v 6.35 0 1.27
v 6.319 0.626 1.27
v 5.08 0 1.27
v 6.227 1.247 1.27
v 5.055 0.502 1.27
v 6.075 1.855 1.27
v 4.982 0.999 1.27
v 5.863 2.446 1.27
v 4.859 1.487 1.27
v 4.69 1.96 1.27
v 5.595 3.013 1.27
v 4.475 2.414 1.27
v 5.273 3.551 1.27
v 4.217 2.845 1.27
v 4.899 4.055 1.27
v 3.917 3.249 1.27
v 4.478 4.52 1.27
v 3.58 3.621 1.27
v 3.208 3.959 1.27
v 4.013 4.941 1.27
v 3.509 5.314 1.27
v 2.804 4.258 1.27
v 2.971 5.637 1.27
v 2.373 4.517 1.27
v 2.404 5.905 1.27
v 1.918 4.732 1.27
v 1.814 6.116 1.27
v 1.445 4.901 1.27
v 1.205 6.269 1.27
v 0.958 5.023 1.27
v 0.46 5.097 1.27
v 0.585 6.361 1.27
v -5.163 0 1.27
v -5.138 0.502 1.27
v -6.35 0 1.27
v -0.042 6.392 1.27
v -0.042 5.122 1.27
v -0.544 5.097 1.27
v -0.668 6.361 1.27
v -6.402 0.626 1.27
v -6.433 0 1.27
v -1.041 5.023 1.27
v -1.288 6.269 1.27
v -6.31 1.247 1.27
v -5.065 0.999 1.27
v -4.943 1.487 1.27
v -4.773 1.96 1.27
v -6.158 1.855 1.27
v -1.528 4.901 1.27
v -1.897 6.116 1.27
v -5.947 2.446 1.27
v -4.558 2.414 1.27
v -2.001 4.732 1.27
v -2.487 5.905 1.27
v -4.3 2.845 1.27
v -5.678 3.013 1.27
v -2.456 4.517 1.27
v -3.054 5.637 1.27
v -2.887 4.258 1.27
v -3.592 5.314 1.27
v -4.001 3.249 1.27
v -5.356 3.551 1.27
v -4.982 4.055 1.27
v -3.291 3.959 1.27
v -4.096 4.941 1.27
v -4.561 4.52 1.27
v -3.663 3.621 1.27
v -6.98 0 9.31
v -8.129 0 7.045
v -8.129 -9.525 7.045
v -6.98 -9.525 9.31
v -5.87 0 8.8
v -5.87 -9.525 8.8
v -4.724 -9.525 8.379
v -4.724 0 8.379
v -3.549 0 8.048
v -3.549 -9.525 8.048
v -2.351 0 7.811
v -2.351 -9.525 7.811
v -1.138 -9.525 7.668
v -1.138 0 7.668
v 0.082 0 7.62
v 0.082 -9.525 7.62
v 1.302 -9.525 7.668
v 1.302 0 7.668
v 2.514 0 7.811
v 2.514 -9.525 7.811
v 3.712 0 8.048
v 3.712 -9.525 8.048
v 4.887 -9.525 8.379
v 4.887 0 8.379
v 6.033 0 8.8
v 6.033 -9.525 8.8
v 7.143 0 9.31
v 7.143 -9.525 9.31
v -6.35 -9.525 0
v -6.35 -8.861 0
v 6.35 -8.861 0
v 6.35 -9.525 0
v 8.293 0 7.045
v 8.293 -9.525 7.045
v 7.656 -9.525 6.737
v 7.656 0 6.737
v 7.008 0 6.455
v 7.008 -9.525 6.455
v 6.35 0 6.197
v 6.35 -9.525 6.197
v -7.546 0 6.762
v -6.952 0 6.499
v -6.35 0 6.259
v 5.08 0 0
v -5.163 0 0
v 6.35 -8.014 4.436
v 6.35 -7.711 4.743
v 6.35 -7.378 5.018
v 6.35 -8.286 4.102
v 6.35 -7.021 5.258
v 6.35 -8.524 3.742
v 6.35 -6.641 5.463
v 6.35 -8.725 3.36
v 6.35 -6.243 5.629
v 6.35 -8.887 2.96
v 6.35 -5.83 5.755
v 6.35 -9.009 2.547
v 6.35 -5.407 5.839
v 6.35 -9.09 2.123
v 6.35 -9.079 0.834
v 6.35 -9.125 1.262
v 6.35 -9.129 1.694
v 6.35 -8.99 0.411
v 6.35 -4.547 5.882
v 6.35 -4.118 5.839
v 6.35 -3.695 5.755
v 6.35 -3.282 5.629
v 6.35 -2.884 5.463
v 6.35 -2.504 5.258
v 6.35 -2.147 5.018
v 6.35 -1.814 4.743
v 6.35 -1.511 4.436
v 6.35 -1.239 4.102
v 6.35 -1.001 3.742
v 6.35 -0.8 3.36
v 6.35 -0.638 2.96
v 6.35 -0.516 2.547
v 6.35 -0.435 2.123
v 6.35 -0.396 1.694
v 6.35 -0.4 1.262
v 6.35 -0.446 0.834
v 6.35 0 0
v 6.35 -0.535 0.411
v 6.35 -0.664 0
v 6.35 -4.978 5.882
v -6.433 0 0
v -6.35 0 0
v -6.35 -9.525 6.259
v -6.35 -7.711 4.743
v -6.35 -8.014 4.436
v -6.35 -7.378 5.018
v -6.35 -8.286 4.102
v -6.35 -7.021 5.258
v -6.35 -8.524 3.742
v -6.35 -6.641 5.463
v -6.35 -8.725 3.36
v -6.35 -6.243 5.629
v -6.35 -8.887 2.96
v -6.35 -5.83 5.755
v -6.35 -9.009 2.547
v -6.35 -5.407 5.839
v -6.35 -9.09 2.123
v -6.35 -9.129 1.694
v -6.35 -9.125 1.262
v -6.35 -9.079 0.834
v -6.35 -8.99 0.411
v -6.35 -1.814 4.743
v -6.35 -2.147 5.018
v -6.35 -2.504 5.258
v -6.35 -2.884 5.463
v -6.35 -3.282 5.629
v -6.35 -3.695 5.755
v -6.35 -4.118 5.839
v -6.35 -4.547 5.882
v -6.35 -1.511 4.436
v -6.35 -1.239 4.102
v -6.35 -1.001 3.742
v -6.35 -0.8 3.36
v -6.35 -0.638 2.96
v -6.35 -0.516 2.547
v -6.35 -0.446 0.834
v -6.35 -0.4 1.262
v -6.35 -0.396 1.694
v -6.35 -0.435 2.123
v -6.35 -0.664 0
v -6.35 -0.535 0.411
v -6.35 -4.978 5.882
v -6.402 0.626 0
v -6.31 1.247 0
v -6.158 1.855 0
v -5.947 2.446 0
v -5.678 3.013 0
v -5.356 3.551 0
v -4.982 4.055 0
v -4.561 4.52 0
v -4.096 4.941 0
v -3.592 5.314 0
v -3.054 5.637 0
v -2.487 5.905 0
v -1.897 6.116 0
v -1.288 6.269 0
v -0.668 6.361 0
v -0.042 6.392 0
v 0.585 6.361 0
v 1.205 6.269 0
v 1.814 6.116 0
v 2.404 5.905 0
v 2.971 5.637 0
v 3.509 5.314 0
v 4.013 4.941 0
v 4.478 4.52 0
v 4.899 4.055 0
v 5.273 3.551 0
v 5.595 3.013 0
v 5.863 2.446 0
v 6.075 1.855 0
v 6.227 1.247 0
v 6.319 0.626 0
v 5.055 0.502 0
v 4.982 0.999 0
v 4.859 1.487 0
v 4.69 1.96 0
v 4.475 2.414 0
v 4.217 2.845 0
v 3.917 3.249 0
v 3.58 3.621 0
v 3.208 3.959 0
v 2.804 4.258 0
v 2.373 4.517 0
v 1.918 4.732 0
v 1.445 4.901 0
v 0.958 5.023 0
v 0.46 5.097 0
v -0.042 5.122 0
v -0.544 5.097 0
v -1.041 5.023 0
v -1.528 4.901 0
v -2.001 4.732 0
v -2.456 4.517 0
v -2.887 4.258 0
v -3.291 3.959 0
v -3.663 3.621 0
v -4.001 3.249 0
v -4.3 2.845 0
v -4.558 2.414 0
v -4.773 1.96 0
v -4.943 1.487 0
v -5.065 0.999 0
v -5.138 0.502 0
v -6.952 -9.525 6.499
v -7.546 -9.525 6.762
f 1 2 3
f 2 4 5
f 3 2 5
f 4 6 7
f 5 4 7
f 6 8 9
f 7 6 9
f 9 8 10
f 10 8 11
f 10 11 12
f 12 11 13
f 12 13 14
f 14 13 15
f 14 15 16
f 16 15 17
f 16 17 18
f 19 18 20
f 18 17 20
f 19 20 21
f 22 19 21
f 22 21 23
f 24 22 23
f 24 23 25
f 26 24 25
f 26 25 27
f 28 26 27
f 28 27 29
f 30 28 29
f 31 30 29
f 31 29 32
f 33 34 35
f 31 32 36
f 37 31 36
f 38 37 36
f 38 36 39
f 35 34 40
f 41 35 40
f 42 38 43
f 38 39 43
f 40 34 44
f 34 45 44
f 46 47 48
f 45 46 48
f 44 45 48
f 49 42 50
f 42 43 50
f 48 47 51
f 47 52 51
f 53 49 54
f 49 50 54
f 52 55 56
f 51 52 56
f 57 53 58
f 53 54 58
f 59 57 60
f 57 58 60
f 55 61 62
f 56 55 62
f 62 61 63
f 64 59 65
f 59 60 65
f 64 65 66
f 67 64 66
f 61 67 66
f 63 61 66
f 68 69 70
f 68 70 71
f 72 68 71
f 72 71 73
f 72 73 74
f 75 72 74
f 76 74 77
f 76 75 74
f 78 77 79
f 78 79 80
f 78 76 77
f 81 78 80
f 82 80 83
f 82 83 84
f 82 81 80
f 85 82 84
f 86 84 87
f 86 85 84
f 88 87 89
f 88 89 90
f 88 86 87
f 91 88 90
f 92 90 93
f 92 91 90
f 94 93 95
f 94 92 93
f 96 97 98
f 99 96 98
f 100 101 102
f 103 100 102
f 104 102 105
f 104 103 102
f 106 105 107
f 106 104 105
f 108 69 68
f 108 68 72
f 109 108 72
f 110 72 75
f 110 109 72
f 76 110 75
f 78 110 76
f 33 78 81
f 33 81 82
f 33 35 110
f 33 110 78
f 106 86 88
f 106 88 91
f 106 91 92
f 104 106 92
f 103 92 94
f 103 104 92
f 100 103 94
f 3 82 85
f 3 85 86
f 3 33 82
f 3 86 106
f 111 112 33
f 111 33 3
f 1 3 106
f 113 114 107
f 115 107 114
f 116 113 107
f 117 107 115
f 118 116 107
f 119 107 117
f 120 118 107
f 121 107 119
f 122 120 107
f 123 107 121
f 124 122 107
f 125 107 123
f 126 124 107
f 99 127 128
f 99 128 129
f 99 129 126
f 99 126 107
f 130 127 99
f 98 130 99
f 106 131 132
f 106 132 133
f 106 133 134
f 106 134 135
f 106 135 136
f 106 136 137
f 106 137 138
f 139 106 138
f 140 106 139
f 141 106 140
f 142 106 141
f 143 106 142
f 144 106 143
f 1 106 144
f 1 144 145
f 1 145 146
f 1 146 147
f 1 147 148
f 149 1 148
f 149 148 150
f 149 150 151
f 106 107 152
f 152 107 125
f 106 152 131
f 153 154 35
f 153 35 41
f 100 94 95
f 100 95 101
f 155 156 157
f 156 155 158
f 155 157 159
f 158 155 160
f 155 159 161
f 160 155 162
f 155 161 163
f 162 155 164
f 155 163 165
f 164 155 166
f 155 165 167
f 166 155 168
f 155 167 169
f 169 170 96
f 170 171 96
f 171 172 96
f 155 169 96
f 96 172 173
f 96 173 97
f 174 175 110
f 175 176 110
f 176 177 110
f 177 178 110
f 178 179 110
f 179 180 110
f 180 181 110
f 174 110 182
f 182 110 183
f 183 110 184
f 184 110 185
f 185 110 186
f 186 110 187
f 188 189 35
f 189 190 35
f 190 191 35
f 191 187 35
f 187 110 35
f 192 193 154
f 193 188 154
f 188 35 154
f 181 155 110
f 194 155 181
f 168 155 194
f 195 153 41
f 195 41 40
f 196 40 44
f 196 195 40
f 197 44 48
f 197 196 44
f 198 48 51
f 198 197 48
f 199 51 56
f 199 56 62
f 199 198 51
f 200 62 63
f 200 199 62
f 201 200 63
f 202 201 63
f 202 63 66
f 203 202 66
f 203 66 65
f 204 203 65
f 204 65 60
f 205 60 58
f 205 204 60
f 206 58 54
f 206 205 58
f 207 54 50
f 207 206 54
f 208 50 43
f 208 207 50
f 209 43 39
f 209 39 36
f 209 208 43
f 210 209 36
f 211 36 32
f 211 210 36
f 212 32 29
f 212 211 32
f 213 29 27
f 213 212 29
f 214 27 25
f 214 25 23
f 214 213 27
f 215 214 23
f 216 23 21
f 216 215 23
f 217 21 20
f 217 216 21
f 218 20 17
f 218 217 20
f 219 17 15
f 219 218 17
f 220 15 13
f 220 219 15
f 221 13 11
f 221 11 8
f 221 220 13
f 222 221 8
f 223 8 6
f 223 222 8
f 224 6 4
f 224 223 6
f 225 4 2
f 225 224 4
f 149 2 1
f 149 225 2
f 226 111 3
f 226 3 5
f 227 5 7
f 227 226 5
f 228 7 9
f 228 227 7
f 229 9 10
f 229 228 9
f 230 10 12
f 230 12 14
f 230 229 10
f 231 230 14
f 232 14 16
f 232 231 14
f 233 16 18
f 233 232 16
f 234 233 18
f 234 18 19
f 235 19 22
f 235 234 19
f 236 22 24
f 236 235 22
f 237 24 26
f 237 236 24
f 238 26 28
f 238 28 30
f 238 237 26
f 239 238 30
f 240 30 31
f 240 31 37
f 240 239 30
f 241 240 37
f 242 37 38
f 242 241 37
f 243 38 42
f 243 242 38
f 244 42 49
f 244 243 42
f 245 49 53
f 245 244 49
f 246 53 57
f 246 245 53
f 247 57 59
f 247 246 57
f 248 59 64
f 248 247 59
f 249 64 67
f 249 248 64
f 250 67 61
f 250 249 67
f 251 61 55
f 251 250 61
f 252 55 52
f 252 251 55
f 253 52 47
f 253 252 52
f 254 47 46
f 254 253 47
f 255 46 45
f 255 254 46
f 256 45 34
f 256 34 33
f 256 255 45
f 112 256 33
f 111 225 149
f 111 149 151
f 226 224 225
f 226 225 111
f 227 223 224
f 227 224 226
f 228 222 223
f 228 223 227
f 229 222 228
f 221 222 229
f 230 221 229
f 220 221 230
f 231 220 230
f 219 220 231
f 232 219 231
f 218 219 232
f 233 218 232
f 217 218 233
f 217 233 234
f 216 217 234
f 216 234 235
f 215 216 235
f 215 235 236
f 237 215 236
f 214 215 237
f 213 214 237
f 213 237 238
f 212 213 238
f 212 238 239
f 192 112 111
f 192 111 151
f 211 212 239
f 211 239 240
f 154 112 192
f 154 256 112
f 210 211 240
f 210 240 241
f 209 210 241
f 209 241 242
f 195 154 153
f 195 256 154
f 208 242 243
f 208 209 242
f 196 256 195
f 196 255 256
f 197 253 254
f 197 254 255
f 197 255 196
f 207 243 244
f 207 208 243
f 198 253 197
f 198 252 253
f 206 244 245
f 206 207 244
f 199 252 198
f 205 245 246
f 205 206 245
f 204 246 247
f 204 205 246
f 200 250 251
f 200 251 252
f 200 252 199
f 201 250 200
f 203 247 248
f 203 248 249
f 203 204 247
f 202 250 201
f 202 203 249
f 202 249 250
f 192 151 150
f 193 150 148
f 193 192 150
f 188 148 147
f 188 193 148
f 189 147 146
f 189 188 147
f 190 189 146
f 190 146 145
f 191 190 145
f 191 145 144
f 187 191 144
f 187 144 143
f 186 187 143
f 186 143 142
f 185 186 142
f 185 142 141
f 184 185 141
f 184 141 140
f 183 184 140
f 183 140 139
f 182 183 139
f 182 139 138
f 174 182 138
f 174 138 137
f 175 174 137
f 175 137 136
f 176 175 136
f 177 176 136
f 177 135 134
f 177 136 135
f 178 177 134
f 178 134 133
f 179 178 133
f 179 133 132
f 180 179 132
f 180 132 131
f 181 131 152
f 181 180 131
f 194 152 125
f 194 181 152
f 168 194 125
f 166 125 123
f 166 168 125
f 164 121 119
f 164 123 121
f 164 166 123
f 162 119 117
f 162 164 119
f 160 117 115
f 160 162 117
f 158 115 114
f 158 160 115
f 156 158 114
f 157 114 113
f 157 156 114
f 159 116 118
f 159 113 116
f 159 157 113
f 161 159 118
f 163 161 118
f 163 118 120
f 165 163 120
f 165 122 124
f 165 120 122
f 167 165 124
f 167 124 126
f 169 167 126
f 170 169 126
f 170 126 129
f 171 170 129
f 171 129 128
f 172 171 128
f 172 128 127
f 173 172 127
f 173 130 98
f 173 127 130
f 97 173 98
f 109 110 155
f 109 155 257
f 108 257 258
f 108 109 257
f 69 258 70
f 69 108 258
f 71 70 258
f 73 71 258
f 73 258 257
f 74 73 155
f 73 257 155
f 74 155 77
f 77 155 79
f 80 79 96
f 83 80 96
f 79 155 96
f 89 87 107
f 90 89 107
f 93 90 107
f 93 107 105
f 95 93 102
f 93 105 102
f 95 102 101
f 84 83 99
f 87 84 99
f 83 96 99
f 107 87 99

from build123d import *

# Parameters (mm, degrees)
SKETCH2_W               = 12.7
SKETCH2_H               = 6.35
BOSS_EXTRUDE1_DEPTH     = 9.525
EXTRUDE_THIN1_DEPTH     = 9.525
CUT_EXTRUDE1_DEPTH      = 16.689738362
CUT_EXTRUDE1_DEPTH_BACK = 16.689738362
SKETCH4_R               = 4.370013209
EXTRUDE_THIN3_DEPTH     = 1.27


with BuildPart() as part:
    # Sketch2 → Boss-Extrude1 (new body)
    with BuildSketch(Plane(origin=(0, 0, 0), x_dir=(1, 0, 0), z_dir=(0, 1, 0))):
        with Locations((0, -3.175)):
            Rectangle(SKETCH2_W, SKETCH2_H)
    extrude(amount=-BOSS_EXTRUDE1_DEPTH)

    # Sketch3 → Extrude-Thin1 (add)
    with BuildSketch(Plane(origin=(0, 0, 0), x_dir=(1, 0, 0), z_dir=(0, 1, 0))):
        with BuildLine():
            ThreePointArc((-6.979657819, -9.309768687), (0.081670878, -7.62), (7.142999576, -9.309768687))
            Line((7.142999576, -9.309768687), (8.292796384, -7.044913879))
            ThreePointArc((8.292796384, -7.044913879), (0.081670878, -5.08), (-8.129454628, -7.044913879))
            Line((-8.129454628, -7.044913879), (-6.979657819, -9.309768687))
        make_face()
    extrude(amount=-EXTRUDE_THIN1_DEPTH)

    # Sketch4 → Cut-Extrude1 (cut, two sides: drawn at the far end of the back side and taken through both)
    with BuildSketch(Plane(origin=(0, 0, 0), x_dir=(0, 0, -1), z_dir=(1, 0, 0)).offset(-CUT_EXTRUDE1_DEPTH_BACK)):
        with Locations((-1.517033844, -4.7625)):
            Circle(SKETCH4_R)
    extrude(amount=CUT_EXTRUDE1_DEPTH + CUT_EXTRUDE1_DEPTH_BACK, mode=Mode.SUBTRACT)

    # Sketch6 → Extrude-Thin3 (add)
    with BuildSketch(Plane.XY):
        with BuildLine():
            ThreePointArc((-6.433087898, 0), (-0.041543949, 6.391543949), (6.35, 0))
            Line((6.35, 0), (5.08, 0))
            ThreePointArc((5.08, 0), (-0.041543949, 5.121543949), (-5.163087898, 0))
            Line((-5.163087898, 0), (-6.433087898, 0))
        make_face()
    extrude(amount=EXTRUDE_THIN3_DEPTH)


solid = part.part
